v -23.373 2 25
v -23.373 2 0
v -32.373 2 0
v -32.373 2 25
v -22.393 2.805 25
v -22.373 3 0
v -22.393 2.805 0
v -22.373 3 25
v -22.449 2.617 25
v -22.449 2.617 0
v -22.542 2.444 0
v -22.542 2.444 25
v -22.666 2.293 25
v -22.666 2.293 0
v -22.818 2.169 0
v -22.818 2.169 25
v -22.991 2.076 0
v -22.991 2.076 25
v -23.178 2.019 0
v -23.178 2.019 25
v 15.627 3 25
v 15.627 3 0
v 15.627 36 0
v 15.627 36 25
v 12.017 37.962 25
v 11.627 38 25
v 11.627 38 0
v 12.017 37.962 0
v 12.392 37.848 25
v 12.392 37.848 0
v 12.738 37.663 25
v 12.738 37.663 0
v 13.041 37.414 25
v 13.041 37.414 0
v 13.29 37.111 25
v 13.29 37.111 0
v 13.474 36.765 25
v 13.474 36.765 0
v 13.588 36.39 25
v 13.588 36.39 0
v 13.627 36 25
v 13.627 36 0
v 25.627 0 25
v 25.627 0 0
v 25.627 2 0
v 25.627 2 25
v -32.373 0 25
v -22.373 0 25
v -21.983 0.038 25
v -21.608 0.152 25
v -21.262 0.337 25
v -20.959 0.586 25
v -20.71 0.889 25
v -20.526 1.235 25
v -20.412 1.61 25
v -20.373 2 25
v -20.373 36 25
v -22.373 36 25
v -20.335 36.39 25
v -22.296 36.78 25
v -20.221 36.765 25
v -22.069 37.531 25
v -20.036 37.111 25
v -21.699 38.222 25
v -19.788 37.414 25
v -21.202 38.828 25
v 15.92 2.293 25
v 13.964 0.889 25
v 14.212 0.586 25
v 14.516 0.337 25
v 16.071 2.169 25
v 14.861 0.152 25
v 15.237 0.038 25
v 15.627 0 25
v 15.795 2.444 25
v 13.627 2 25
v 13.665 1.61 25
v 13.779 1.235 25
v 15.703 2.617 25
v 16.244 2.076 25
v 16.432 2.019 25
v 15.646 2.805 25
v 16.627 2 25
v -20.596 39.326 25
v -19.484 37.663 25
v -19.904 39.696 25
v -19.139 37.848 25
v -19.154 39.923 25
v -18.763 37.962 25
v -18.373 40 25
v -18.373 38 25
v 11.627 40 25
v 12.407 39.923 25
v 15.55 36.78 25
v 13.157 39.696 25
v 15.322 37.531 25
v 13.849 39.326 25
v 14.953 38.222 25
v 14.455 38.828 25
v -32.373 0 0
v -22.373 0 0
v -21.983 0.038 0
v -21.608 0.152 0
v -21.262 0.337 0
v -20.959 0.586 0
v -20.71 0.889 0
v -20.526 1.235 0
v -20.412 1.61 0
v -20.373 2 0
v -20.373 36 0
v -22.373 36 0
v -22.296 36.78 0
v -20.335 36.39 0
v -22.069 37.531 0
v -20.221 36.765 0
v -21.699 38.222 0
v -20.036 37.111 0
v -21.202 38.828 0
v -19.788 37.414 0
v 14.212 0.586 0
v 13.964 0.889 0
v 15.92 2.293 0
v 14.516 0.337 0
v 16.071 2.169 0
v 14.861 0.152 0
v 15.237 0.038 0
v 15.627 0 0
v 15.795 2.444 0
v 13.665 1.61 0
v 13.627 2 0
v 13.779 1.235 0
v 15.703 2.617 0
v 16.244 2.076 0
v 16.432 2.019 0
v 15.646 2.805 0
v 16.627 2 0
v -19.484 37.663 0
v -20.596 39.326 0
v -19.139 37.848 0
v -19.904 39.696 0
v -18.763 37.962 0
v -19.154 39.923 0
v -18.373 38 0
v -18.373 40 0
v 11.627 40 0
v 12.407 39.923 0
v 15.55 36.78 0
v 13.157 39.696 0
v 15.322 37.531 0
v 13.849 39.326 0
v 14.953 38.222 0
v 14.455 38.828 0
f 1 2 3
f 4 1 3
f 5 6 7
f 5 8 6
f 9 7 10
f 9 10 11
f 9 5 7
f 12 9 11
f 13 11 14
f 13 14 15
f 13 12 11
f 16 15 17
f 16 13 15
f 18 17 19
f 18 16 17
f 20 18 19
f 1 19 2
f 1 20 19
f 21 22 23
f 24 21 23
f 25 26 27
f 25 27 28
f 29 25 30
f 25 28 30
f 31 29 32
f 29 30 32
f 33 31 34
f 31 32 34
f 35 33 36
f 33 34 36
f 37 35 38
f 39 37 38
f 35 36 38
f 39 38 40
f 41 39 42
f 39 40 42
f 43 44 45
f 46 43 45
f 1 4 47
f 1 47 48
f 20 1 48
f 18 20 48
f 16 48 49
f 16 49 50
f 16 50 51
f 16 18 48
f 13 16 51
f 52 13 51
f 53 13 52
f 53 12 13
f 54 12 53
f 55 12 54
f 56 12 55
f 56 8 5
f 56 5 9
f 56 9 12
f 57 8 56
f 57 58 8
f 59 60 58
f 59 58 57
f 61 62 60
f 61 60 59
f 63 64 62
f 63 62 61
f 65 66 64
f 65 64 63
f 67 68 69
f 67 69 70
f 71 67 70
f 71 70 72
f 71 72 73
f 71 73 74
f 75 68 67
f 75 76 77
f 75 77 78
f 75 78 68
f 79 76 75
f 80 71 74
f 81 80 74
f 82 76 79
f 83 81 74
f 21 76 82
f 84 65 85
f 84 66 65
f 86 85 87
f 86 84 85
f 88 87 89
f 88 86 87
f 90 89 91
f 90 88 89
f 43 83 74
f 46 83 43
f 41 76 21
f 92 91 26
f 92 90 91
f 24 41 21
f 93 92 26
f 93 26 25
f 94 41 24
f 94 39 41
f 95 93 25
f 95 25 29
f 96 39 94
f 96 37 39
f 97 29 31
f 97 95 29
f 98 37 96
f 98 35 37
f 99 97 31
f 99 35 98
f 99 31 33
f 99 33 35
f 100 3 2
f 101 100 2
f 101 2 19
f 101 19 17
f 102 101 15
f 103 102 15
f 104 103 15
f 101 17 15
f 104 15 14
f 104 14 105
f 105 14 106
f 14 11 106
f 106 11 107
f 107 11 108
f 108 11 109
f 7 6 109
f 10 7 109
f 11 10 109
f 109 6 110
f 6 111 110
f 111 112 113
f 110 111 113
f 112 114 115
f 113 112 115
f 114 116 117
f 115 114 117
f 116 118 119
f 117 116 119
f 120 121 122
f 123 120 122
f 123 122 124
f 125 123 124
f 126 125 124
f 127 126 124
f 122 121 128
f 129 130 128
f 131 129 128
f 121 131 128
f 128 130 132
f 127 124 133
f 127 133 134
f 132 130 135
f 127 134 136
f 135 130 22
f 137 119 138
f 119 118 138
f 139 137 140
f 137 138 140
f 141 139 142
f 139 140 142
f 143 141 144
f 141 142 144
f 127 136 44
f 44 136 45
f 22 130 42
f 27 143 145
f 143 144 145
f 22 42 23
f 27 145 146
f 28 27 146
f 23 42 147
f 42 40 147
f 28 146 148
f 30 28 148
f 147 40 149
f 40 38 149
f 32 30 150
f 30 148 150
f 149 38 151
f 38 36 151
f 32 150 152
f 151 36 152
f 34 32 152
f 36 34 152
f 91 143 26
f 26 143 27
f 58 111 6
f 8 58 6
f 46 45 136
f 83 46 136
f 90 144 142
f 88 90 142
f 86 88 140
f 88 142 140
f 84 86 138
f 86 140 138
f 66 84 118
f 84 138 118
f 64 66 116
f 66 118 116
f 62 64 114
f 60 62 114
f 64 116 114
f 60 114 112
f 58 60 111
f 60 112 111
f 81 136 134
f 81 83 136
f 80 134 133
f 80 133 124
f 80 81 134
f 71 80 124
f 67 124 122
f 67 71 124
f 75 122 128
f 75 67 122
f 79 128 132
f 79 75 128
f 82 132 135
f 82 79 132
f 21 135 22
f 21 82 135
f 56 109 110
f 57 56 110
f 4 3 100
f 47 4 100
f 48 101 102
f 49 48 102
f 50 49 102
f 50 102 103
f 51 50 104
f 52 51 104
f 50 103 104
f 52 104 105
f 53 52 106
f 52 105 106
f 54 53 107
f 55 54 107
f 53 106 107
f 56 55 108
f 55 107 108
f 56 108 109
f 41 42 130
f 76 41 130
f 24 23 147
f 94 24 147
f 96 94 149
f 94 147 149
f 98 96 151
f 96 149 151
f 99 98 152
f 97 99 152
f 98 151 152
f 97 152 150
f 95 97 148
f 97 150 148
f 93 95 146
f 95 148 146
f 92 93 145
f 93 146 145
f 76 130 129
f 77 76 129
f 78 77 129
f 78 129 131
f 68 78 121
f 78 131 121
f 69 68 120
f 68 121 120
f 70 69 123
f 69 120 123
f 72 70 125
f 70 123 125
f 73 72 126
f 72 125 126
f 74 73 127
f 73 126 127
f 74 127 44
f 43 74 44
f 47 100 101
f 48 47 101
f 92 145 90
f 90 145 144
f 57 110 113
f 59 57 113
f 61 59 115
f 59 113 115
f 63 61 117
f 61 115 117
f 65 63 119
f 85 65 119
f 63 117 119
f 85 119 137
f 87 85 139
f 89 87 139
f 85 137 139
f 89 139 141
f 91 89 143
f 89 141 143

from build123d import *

# Parameters (mm, degrees)
EXTRU_MINCE1_DEPTH = 25
CONG_1_R           = 1


with BuildPart() as part:
    # Esquisse1 → Extru.-Mince1 (new body)
    with BuildSketch(Plane.XY):
        with BuildLine():
            Line((-32.373305915, 0), (-22.373305915, 0))
            ThreePointArc((-22.373305915, 0), (-20.959092353, 0.585786438), (-20.373305915, 2))
            Line((-20.373305915, 2), (-20.373305915, 36))
            ThreePointArc((-20.373305915, 36), (-19.787519478, 37.414213562), (-18.373305915, 38))
            Line((-18.373305915, 38), (11.626694085, 38))
            ThreePointArc((11.626694085, 38), (13.040907647, 37.414213562), (13.626694085, 36))
            Line((13.626694085, 36), (13.626694085, 2))
            ThreePointArc((13.626694085, 2), (14.212480522, 0.585786438), (15.626694085, 0))
            Line((15.626694085, 0), (25.626694085, 0))
            Line((25.626694085, 0), (25.626694085, 2))
            Line((25.626694085, 2), (15.626694085, 2))
            Line((15.626694085, 2), (15.626694085, 36))
            ThreePointArc((15.626694085, 36), (14.455121209, 38.828427125), (11.626694085, 40))
            Line((11.626694085, 40), (-18.373305915, 40))
            ThreePointArc((-18.373305915, 40), (-21.20173304, 38.828427125), (-22.373305915, 36))
            Line((-22.373305915, 36), (-22.373305915, 2))
            Line((-22.373305915, 2), (-32.373305915, 2))
            Line((-32.373305915, 2), (-32.373305915, 0))
        make_face()
    extrude(amount=EXTRU_MINCE1_DEPTH)

    # Congé1
    cong_1_edges = [part.edges().sort_by_distance(p)[0] for p in [
        (-22.373305915, 2, 12.5),
        (15.626694085, 2, 12.5),
    ]]
    fillet(cong_1_edges, radius=CONG_1_R)


solid = part.part
